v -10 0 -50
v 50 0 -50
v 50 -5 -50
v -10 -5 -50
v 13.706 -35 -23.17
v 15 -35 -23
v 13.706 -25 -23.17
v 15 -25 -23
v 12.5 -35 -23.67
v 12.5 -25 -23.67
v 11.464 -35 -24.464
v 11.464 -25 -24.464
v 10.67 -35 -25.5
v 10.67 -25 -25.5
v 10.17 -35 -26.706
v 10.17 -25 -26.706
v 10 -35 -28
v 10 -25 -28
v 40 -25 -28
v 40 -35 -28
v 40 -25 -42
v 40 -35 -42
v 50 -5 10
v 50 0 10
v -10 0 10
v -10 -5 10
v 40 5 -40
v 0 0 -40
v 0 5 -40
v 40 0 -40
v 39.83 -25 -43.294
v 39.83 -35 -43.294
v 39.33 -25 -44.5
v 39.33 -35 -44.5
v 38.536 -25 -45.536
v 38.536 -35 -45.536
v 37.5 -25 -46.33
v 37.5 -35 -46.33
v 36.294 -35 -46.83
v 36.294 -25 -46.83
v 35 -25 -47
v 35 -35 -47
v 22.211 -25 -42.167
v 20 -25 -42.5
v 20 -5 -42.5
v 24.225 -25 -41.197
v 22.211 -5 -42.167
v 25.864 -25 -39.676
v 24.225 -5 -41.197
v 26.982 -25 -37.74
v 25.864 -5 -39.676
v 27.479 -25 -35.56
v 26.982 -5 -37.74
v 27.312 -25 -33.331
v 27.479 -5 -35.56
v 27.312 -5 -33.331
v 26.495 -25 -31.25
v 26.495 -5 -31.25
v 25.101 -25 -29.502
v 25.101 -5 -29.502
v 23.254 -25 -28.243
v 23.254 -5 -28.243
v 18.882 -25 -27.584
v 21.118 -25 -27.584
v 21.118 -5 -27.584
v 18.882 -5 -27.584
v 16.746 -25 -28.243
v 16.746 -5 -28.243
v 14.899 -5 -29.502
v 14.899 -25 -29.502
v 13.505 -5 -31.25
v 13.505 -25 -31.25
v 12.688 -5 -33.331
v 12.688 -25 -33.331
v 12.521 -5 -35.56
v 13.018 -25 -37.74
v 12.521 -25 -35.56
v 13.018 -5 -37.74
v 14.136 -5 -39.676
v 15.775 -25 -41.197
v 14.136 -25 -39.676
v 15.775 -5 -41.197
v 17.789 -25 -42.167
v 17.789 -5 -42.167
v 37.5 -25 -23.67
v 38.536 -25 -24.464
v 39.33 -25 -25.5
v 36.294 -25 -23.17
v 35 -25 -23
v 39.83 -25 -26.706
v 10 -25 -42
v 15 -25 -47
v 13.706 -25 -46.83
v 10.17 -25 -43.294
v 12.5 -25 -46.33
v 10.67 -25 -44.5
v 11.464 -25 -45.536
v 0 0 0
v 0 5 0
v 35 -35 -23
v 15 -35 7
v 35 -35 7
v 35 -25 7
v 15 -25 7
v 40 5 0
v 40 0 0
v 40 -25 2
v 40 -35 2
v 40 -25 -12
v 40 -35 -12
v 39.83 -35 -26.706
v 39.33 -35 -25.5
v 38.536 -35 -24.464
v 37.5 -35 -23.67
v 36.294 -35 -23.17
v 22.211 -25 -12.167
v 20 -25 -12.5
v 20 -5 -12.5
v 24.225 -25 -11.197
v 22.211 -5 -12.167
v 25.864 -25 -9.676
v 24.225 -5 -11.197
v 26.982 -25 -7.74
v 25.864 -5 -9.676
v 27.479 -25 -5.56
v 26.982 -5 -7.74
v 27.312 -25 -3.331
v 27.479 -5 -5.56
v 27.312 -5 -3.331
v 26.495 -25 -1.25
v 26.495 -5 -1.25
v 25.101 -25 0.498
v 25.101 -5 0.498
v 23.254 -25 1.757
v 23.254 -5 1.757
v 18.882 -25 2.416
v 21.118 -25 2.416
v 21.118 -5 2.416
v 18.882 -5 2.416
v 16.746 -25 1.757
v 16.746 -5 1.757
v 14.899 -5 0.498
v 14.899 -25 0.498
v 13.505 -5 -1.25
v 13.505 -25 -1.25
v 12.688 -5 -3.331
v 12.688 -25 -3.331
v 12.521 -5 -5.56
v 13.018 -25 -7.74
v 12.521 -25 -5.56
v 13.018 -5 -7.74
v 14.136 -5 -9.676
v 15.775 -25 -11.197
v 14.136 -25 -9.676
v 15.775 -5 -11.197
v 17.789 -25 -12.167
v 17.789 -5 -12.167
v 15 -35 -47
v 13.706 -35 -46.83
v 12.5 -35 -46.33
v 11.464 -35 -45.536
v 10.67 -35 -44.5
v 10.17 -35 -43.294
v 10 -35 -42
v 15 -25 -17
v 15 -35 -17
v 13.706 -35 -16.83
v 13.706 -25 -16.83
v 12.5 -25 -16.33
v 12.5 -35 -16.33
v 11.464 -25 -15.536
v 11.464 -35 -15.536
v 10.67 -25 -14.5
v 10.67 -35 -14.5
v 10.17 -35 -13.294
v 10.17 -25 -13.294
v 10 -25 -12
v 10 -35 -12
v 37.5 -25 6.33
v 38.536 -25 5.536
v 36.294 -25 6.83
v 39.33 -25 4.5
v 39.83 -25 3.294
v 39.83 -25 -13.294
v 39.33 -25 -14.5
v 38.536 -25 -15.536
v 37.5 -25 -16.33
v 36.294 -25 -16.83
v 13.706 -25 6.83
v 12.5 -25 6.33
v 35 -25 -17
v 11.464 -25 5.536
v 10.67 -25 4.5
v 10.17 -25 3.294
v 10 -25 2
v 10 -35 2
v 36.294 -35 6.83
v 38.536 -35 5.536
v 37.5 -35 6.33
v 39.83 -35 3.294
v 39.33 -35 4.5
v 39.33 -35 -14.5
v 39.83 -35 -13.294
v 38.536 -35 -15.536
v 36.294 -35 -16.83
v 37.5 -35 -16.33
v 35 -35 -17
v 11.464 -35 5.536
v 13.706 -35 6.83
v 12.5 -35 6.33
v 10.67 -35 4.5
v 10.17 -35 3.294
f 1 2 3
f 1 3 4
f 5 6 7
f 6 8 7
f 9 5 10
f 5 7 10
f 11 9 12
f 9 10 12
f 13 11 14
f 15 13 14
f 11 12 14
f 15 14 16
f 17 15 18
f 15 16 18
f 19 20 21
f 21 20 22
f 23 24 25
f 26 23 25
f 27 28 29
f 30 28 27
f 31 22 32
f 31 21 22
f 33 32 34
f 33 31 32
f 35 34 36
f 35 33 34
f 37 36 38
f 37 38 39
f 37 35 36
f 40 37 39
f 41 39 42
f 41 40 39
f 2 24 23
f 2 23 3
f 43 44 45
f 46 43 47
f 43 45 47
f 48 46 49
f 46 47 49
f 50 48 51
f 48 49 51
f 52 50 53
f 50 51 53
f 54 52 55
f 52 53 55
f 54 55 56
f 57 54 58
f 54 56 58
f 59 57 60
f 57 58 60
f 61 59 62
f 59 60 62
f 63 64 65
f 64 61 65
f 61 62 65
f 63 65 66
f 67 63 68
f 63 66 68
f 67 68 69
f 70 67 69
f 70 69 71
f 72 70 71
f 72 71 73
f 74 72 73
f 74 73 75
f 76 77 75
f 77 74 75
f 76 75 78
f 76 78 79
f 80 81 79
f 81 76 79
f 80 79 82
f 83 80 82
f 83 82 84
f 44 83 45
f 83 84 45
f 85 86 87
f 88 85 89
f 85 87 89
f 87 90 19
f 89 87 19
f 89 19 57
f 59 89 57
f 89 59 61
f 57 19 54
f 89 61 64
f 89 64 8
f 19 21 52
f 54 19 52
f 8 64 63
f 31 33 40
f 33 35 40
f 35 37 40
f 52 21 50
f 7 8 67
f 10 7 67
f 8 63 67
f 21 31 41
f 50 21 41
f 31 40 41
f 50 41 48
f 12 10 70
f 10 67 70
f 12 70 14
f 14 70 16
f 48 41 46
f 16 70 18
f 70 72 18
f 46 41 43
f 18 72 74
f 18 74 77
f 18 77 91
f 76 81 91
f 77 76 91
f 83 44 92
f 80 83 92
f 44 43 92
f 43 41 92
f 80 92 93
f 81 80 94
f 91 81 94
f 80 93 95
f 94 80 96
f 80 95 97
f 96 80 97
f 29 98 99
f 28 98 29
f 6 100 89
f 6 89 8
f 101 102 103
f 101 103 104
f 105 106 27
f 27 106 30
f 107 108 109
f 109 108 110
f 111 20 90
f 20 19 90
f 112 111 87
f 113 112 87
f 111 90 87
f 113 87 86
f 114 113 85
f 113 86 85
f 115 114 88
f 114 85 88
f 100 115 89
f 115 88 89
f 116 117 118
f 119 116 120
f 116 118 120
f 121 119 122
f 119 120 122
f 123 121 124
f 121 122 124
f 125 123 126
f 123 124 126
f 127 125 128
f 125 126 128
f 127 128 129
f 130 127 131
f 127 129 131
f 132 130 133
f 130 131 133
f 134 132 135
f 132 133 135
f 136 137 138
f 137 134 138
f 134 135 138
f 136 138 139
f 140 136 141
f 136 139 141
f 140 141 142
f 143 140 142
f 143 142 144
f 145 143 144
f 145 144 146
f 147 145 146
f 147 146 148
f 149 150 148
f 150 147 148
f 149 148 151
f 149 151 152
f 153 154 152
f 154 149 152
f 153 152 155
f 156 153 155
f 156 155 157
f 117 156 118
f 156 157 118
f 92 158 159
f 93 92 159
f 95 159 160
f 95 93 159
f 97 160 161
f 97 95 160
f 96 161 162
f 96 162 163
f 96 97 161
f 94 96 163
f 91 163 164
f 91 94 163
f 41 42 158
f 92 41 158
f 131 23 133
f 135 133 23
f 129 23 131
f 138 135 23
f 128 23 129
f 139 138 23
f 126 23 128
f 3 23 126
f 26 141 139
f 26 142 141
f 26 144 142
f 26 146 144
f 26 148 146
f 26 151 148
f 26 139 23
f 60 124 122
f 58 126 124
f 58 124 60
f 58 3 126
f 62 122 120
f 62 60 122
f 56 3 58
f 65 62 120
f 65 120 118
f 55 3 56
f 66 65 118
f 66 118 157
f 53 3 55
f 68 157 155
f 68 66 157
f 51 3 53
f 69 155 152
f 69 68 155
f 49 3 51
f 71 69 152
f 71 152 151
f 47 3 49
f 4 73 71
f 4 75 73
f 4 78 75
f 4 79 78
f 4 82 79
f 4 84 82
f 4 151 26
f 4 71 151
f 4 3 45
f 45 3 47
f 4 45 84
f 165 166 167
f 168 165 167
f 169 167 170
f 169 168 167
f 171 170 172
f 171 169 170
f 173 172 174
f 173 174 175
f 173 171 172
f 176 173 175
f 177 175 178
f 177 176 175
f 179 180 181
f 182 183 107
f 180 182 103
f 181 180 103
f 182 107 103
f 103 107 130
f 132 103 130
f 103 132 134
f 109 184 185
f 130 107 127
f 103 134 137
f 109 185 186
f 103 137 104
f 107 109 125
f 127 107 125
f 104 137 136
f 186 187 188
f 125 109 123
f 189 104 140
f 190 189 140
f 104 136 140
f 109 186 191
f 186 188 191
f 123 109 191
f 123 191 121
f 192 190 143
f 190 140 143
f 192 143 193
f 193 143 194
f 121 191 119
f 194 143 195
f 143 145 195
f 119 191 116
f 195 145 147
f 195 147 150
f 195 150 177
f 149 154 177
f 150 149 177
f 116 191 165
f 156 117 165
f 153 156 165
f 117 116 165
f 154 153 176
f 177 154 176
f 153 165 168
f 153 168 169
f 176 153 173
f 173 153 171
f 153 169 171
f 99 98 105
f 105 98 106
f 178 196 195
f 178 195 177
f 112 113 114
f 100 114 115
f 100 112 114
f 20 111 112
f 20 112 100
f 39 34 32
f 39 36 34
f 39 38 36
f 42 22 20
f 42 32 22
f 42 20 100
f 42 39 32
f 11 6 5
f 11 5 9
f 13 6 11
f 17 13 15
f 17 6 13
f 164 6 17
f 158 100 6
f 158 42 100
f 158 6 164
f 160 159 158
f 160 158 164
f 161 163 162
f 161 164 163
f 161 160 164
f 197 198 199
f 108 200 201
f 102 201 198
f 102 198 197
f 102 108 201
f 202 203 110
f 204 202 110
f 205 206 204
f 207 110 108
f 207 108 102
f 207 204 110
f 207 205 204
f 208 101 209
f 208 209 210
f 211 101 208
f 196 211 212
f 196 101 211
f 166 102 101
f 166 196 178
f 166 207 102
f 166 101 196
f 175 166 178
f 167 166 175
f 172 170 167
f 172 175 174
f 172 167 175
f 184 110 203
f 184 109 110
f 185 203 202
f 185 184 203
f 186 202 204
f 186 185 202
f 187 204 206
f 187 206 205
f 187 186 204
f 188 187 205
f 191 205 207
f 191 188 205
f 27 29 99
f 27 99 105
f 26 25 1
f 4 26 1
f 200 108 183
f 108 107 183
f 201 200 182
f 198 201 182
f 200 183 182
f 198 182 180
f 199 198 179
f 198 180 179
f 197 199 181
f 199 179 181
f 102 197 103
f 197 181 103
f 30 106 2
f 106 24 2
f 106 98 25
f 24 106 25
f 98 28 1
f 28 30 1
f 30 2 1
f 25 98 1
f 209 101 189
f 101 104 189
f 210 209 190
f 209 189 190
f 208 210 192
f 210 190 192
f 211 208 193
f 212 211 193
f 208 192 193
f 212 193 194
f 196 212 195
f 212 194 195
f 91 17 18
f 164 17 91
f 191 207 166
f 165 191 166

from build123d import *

# Parameters (mm, degrees)
SKETCH1_W           = 40
SKETCH1_H           = 40
BOSS_EXTRUDE1_DEPTH = 5
SKETCH2_W           = 60
SKETCH2_H           = 60
BOSS_EXTRUDE2_DEPTH = 5
SKETCH3_R           = 7.5
BOSS_EXTRUDE3_DEPTH = 30
SKETCH4_W           = 30
SKETCH4_H           = 24
BOSS_EXTRUDE5_DEPTH = 10
FILLET1_R           = 5


with BuildPart() as part:
    # Sketch1 → Boss-Extrude1 (new body)
    with BuildSketch(Plane(origin=(0, 0, 0), x_dir=(1, 0, 0), z_dir=(0, 1, 0))):
        with Locations((20, 20)):
            Rectangle(SKETCH1_W, SKETCH1_H)
    extrude(amount=BOSS_EXTRUDE1_DEPTH)

    # Sketch2 → Boss-Extrude2 (add)
    with BuildSketch(Plane(origin=(0, 0, 0), x_dir=(-1, 0, 0), z_dir=(0, -1, 0))):
        with Locations((-20, 20)):
            Rectangle(SKETCH2_W, SKETCH2_H)
    extrude(amount=BOSS_EXTRUDE2_DEPTH)

    # Sketch3 → Boss-Extrude3 (add)
    with BuildSketch(Plane(origin=(0, -5, 0), x_dir=(-1, 0, 0), z_dir=(0, -1, 0))):
        with Locations(Location((-20, 5, 0), (0, 0, 90))):
            Circle(SKETCH3_R)
        with Locations(Location((-20, 35, 0), (0, 0, 90))):
            Circle(SKETCH3_R)
    extrude(amount=BOSS_EXTRUDE3_DEPTH)

    # Sketch4 → Boss-Extrude5 (add)
    with BuildSketch(Plane(origin=(0, -35, 0), x_dir=(-1, 0, 0), z_dir=(0, -1, 0))):
        with Locations((-25, 5)):
            Rectangle(SKETCH4_W, SKETCH4_H)
        with Locations((-25, 35)):
            Rectangle(SKETCH4_W, SKETCH4_H)
    extrude(amount=-BOSS_EXTRUDE5_DEPTH)

    # Fillet1
    fillet1_edges = [part.edges().sort_by_distance(p)[0] for p in [
        (40, -30, 7),
        (40, -30, -17),
        (10, -30, -17),
        (10, -30, 7),
        (40, -30, -23),
        (40, -30, -47),
        (10, -30, -47),
        (10, -30, -23),
    ]]
    fillet(fillet1_edges, radius=FILLET1_R)


solid = part.part
